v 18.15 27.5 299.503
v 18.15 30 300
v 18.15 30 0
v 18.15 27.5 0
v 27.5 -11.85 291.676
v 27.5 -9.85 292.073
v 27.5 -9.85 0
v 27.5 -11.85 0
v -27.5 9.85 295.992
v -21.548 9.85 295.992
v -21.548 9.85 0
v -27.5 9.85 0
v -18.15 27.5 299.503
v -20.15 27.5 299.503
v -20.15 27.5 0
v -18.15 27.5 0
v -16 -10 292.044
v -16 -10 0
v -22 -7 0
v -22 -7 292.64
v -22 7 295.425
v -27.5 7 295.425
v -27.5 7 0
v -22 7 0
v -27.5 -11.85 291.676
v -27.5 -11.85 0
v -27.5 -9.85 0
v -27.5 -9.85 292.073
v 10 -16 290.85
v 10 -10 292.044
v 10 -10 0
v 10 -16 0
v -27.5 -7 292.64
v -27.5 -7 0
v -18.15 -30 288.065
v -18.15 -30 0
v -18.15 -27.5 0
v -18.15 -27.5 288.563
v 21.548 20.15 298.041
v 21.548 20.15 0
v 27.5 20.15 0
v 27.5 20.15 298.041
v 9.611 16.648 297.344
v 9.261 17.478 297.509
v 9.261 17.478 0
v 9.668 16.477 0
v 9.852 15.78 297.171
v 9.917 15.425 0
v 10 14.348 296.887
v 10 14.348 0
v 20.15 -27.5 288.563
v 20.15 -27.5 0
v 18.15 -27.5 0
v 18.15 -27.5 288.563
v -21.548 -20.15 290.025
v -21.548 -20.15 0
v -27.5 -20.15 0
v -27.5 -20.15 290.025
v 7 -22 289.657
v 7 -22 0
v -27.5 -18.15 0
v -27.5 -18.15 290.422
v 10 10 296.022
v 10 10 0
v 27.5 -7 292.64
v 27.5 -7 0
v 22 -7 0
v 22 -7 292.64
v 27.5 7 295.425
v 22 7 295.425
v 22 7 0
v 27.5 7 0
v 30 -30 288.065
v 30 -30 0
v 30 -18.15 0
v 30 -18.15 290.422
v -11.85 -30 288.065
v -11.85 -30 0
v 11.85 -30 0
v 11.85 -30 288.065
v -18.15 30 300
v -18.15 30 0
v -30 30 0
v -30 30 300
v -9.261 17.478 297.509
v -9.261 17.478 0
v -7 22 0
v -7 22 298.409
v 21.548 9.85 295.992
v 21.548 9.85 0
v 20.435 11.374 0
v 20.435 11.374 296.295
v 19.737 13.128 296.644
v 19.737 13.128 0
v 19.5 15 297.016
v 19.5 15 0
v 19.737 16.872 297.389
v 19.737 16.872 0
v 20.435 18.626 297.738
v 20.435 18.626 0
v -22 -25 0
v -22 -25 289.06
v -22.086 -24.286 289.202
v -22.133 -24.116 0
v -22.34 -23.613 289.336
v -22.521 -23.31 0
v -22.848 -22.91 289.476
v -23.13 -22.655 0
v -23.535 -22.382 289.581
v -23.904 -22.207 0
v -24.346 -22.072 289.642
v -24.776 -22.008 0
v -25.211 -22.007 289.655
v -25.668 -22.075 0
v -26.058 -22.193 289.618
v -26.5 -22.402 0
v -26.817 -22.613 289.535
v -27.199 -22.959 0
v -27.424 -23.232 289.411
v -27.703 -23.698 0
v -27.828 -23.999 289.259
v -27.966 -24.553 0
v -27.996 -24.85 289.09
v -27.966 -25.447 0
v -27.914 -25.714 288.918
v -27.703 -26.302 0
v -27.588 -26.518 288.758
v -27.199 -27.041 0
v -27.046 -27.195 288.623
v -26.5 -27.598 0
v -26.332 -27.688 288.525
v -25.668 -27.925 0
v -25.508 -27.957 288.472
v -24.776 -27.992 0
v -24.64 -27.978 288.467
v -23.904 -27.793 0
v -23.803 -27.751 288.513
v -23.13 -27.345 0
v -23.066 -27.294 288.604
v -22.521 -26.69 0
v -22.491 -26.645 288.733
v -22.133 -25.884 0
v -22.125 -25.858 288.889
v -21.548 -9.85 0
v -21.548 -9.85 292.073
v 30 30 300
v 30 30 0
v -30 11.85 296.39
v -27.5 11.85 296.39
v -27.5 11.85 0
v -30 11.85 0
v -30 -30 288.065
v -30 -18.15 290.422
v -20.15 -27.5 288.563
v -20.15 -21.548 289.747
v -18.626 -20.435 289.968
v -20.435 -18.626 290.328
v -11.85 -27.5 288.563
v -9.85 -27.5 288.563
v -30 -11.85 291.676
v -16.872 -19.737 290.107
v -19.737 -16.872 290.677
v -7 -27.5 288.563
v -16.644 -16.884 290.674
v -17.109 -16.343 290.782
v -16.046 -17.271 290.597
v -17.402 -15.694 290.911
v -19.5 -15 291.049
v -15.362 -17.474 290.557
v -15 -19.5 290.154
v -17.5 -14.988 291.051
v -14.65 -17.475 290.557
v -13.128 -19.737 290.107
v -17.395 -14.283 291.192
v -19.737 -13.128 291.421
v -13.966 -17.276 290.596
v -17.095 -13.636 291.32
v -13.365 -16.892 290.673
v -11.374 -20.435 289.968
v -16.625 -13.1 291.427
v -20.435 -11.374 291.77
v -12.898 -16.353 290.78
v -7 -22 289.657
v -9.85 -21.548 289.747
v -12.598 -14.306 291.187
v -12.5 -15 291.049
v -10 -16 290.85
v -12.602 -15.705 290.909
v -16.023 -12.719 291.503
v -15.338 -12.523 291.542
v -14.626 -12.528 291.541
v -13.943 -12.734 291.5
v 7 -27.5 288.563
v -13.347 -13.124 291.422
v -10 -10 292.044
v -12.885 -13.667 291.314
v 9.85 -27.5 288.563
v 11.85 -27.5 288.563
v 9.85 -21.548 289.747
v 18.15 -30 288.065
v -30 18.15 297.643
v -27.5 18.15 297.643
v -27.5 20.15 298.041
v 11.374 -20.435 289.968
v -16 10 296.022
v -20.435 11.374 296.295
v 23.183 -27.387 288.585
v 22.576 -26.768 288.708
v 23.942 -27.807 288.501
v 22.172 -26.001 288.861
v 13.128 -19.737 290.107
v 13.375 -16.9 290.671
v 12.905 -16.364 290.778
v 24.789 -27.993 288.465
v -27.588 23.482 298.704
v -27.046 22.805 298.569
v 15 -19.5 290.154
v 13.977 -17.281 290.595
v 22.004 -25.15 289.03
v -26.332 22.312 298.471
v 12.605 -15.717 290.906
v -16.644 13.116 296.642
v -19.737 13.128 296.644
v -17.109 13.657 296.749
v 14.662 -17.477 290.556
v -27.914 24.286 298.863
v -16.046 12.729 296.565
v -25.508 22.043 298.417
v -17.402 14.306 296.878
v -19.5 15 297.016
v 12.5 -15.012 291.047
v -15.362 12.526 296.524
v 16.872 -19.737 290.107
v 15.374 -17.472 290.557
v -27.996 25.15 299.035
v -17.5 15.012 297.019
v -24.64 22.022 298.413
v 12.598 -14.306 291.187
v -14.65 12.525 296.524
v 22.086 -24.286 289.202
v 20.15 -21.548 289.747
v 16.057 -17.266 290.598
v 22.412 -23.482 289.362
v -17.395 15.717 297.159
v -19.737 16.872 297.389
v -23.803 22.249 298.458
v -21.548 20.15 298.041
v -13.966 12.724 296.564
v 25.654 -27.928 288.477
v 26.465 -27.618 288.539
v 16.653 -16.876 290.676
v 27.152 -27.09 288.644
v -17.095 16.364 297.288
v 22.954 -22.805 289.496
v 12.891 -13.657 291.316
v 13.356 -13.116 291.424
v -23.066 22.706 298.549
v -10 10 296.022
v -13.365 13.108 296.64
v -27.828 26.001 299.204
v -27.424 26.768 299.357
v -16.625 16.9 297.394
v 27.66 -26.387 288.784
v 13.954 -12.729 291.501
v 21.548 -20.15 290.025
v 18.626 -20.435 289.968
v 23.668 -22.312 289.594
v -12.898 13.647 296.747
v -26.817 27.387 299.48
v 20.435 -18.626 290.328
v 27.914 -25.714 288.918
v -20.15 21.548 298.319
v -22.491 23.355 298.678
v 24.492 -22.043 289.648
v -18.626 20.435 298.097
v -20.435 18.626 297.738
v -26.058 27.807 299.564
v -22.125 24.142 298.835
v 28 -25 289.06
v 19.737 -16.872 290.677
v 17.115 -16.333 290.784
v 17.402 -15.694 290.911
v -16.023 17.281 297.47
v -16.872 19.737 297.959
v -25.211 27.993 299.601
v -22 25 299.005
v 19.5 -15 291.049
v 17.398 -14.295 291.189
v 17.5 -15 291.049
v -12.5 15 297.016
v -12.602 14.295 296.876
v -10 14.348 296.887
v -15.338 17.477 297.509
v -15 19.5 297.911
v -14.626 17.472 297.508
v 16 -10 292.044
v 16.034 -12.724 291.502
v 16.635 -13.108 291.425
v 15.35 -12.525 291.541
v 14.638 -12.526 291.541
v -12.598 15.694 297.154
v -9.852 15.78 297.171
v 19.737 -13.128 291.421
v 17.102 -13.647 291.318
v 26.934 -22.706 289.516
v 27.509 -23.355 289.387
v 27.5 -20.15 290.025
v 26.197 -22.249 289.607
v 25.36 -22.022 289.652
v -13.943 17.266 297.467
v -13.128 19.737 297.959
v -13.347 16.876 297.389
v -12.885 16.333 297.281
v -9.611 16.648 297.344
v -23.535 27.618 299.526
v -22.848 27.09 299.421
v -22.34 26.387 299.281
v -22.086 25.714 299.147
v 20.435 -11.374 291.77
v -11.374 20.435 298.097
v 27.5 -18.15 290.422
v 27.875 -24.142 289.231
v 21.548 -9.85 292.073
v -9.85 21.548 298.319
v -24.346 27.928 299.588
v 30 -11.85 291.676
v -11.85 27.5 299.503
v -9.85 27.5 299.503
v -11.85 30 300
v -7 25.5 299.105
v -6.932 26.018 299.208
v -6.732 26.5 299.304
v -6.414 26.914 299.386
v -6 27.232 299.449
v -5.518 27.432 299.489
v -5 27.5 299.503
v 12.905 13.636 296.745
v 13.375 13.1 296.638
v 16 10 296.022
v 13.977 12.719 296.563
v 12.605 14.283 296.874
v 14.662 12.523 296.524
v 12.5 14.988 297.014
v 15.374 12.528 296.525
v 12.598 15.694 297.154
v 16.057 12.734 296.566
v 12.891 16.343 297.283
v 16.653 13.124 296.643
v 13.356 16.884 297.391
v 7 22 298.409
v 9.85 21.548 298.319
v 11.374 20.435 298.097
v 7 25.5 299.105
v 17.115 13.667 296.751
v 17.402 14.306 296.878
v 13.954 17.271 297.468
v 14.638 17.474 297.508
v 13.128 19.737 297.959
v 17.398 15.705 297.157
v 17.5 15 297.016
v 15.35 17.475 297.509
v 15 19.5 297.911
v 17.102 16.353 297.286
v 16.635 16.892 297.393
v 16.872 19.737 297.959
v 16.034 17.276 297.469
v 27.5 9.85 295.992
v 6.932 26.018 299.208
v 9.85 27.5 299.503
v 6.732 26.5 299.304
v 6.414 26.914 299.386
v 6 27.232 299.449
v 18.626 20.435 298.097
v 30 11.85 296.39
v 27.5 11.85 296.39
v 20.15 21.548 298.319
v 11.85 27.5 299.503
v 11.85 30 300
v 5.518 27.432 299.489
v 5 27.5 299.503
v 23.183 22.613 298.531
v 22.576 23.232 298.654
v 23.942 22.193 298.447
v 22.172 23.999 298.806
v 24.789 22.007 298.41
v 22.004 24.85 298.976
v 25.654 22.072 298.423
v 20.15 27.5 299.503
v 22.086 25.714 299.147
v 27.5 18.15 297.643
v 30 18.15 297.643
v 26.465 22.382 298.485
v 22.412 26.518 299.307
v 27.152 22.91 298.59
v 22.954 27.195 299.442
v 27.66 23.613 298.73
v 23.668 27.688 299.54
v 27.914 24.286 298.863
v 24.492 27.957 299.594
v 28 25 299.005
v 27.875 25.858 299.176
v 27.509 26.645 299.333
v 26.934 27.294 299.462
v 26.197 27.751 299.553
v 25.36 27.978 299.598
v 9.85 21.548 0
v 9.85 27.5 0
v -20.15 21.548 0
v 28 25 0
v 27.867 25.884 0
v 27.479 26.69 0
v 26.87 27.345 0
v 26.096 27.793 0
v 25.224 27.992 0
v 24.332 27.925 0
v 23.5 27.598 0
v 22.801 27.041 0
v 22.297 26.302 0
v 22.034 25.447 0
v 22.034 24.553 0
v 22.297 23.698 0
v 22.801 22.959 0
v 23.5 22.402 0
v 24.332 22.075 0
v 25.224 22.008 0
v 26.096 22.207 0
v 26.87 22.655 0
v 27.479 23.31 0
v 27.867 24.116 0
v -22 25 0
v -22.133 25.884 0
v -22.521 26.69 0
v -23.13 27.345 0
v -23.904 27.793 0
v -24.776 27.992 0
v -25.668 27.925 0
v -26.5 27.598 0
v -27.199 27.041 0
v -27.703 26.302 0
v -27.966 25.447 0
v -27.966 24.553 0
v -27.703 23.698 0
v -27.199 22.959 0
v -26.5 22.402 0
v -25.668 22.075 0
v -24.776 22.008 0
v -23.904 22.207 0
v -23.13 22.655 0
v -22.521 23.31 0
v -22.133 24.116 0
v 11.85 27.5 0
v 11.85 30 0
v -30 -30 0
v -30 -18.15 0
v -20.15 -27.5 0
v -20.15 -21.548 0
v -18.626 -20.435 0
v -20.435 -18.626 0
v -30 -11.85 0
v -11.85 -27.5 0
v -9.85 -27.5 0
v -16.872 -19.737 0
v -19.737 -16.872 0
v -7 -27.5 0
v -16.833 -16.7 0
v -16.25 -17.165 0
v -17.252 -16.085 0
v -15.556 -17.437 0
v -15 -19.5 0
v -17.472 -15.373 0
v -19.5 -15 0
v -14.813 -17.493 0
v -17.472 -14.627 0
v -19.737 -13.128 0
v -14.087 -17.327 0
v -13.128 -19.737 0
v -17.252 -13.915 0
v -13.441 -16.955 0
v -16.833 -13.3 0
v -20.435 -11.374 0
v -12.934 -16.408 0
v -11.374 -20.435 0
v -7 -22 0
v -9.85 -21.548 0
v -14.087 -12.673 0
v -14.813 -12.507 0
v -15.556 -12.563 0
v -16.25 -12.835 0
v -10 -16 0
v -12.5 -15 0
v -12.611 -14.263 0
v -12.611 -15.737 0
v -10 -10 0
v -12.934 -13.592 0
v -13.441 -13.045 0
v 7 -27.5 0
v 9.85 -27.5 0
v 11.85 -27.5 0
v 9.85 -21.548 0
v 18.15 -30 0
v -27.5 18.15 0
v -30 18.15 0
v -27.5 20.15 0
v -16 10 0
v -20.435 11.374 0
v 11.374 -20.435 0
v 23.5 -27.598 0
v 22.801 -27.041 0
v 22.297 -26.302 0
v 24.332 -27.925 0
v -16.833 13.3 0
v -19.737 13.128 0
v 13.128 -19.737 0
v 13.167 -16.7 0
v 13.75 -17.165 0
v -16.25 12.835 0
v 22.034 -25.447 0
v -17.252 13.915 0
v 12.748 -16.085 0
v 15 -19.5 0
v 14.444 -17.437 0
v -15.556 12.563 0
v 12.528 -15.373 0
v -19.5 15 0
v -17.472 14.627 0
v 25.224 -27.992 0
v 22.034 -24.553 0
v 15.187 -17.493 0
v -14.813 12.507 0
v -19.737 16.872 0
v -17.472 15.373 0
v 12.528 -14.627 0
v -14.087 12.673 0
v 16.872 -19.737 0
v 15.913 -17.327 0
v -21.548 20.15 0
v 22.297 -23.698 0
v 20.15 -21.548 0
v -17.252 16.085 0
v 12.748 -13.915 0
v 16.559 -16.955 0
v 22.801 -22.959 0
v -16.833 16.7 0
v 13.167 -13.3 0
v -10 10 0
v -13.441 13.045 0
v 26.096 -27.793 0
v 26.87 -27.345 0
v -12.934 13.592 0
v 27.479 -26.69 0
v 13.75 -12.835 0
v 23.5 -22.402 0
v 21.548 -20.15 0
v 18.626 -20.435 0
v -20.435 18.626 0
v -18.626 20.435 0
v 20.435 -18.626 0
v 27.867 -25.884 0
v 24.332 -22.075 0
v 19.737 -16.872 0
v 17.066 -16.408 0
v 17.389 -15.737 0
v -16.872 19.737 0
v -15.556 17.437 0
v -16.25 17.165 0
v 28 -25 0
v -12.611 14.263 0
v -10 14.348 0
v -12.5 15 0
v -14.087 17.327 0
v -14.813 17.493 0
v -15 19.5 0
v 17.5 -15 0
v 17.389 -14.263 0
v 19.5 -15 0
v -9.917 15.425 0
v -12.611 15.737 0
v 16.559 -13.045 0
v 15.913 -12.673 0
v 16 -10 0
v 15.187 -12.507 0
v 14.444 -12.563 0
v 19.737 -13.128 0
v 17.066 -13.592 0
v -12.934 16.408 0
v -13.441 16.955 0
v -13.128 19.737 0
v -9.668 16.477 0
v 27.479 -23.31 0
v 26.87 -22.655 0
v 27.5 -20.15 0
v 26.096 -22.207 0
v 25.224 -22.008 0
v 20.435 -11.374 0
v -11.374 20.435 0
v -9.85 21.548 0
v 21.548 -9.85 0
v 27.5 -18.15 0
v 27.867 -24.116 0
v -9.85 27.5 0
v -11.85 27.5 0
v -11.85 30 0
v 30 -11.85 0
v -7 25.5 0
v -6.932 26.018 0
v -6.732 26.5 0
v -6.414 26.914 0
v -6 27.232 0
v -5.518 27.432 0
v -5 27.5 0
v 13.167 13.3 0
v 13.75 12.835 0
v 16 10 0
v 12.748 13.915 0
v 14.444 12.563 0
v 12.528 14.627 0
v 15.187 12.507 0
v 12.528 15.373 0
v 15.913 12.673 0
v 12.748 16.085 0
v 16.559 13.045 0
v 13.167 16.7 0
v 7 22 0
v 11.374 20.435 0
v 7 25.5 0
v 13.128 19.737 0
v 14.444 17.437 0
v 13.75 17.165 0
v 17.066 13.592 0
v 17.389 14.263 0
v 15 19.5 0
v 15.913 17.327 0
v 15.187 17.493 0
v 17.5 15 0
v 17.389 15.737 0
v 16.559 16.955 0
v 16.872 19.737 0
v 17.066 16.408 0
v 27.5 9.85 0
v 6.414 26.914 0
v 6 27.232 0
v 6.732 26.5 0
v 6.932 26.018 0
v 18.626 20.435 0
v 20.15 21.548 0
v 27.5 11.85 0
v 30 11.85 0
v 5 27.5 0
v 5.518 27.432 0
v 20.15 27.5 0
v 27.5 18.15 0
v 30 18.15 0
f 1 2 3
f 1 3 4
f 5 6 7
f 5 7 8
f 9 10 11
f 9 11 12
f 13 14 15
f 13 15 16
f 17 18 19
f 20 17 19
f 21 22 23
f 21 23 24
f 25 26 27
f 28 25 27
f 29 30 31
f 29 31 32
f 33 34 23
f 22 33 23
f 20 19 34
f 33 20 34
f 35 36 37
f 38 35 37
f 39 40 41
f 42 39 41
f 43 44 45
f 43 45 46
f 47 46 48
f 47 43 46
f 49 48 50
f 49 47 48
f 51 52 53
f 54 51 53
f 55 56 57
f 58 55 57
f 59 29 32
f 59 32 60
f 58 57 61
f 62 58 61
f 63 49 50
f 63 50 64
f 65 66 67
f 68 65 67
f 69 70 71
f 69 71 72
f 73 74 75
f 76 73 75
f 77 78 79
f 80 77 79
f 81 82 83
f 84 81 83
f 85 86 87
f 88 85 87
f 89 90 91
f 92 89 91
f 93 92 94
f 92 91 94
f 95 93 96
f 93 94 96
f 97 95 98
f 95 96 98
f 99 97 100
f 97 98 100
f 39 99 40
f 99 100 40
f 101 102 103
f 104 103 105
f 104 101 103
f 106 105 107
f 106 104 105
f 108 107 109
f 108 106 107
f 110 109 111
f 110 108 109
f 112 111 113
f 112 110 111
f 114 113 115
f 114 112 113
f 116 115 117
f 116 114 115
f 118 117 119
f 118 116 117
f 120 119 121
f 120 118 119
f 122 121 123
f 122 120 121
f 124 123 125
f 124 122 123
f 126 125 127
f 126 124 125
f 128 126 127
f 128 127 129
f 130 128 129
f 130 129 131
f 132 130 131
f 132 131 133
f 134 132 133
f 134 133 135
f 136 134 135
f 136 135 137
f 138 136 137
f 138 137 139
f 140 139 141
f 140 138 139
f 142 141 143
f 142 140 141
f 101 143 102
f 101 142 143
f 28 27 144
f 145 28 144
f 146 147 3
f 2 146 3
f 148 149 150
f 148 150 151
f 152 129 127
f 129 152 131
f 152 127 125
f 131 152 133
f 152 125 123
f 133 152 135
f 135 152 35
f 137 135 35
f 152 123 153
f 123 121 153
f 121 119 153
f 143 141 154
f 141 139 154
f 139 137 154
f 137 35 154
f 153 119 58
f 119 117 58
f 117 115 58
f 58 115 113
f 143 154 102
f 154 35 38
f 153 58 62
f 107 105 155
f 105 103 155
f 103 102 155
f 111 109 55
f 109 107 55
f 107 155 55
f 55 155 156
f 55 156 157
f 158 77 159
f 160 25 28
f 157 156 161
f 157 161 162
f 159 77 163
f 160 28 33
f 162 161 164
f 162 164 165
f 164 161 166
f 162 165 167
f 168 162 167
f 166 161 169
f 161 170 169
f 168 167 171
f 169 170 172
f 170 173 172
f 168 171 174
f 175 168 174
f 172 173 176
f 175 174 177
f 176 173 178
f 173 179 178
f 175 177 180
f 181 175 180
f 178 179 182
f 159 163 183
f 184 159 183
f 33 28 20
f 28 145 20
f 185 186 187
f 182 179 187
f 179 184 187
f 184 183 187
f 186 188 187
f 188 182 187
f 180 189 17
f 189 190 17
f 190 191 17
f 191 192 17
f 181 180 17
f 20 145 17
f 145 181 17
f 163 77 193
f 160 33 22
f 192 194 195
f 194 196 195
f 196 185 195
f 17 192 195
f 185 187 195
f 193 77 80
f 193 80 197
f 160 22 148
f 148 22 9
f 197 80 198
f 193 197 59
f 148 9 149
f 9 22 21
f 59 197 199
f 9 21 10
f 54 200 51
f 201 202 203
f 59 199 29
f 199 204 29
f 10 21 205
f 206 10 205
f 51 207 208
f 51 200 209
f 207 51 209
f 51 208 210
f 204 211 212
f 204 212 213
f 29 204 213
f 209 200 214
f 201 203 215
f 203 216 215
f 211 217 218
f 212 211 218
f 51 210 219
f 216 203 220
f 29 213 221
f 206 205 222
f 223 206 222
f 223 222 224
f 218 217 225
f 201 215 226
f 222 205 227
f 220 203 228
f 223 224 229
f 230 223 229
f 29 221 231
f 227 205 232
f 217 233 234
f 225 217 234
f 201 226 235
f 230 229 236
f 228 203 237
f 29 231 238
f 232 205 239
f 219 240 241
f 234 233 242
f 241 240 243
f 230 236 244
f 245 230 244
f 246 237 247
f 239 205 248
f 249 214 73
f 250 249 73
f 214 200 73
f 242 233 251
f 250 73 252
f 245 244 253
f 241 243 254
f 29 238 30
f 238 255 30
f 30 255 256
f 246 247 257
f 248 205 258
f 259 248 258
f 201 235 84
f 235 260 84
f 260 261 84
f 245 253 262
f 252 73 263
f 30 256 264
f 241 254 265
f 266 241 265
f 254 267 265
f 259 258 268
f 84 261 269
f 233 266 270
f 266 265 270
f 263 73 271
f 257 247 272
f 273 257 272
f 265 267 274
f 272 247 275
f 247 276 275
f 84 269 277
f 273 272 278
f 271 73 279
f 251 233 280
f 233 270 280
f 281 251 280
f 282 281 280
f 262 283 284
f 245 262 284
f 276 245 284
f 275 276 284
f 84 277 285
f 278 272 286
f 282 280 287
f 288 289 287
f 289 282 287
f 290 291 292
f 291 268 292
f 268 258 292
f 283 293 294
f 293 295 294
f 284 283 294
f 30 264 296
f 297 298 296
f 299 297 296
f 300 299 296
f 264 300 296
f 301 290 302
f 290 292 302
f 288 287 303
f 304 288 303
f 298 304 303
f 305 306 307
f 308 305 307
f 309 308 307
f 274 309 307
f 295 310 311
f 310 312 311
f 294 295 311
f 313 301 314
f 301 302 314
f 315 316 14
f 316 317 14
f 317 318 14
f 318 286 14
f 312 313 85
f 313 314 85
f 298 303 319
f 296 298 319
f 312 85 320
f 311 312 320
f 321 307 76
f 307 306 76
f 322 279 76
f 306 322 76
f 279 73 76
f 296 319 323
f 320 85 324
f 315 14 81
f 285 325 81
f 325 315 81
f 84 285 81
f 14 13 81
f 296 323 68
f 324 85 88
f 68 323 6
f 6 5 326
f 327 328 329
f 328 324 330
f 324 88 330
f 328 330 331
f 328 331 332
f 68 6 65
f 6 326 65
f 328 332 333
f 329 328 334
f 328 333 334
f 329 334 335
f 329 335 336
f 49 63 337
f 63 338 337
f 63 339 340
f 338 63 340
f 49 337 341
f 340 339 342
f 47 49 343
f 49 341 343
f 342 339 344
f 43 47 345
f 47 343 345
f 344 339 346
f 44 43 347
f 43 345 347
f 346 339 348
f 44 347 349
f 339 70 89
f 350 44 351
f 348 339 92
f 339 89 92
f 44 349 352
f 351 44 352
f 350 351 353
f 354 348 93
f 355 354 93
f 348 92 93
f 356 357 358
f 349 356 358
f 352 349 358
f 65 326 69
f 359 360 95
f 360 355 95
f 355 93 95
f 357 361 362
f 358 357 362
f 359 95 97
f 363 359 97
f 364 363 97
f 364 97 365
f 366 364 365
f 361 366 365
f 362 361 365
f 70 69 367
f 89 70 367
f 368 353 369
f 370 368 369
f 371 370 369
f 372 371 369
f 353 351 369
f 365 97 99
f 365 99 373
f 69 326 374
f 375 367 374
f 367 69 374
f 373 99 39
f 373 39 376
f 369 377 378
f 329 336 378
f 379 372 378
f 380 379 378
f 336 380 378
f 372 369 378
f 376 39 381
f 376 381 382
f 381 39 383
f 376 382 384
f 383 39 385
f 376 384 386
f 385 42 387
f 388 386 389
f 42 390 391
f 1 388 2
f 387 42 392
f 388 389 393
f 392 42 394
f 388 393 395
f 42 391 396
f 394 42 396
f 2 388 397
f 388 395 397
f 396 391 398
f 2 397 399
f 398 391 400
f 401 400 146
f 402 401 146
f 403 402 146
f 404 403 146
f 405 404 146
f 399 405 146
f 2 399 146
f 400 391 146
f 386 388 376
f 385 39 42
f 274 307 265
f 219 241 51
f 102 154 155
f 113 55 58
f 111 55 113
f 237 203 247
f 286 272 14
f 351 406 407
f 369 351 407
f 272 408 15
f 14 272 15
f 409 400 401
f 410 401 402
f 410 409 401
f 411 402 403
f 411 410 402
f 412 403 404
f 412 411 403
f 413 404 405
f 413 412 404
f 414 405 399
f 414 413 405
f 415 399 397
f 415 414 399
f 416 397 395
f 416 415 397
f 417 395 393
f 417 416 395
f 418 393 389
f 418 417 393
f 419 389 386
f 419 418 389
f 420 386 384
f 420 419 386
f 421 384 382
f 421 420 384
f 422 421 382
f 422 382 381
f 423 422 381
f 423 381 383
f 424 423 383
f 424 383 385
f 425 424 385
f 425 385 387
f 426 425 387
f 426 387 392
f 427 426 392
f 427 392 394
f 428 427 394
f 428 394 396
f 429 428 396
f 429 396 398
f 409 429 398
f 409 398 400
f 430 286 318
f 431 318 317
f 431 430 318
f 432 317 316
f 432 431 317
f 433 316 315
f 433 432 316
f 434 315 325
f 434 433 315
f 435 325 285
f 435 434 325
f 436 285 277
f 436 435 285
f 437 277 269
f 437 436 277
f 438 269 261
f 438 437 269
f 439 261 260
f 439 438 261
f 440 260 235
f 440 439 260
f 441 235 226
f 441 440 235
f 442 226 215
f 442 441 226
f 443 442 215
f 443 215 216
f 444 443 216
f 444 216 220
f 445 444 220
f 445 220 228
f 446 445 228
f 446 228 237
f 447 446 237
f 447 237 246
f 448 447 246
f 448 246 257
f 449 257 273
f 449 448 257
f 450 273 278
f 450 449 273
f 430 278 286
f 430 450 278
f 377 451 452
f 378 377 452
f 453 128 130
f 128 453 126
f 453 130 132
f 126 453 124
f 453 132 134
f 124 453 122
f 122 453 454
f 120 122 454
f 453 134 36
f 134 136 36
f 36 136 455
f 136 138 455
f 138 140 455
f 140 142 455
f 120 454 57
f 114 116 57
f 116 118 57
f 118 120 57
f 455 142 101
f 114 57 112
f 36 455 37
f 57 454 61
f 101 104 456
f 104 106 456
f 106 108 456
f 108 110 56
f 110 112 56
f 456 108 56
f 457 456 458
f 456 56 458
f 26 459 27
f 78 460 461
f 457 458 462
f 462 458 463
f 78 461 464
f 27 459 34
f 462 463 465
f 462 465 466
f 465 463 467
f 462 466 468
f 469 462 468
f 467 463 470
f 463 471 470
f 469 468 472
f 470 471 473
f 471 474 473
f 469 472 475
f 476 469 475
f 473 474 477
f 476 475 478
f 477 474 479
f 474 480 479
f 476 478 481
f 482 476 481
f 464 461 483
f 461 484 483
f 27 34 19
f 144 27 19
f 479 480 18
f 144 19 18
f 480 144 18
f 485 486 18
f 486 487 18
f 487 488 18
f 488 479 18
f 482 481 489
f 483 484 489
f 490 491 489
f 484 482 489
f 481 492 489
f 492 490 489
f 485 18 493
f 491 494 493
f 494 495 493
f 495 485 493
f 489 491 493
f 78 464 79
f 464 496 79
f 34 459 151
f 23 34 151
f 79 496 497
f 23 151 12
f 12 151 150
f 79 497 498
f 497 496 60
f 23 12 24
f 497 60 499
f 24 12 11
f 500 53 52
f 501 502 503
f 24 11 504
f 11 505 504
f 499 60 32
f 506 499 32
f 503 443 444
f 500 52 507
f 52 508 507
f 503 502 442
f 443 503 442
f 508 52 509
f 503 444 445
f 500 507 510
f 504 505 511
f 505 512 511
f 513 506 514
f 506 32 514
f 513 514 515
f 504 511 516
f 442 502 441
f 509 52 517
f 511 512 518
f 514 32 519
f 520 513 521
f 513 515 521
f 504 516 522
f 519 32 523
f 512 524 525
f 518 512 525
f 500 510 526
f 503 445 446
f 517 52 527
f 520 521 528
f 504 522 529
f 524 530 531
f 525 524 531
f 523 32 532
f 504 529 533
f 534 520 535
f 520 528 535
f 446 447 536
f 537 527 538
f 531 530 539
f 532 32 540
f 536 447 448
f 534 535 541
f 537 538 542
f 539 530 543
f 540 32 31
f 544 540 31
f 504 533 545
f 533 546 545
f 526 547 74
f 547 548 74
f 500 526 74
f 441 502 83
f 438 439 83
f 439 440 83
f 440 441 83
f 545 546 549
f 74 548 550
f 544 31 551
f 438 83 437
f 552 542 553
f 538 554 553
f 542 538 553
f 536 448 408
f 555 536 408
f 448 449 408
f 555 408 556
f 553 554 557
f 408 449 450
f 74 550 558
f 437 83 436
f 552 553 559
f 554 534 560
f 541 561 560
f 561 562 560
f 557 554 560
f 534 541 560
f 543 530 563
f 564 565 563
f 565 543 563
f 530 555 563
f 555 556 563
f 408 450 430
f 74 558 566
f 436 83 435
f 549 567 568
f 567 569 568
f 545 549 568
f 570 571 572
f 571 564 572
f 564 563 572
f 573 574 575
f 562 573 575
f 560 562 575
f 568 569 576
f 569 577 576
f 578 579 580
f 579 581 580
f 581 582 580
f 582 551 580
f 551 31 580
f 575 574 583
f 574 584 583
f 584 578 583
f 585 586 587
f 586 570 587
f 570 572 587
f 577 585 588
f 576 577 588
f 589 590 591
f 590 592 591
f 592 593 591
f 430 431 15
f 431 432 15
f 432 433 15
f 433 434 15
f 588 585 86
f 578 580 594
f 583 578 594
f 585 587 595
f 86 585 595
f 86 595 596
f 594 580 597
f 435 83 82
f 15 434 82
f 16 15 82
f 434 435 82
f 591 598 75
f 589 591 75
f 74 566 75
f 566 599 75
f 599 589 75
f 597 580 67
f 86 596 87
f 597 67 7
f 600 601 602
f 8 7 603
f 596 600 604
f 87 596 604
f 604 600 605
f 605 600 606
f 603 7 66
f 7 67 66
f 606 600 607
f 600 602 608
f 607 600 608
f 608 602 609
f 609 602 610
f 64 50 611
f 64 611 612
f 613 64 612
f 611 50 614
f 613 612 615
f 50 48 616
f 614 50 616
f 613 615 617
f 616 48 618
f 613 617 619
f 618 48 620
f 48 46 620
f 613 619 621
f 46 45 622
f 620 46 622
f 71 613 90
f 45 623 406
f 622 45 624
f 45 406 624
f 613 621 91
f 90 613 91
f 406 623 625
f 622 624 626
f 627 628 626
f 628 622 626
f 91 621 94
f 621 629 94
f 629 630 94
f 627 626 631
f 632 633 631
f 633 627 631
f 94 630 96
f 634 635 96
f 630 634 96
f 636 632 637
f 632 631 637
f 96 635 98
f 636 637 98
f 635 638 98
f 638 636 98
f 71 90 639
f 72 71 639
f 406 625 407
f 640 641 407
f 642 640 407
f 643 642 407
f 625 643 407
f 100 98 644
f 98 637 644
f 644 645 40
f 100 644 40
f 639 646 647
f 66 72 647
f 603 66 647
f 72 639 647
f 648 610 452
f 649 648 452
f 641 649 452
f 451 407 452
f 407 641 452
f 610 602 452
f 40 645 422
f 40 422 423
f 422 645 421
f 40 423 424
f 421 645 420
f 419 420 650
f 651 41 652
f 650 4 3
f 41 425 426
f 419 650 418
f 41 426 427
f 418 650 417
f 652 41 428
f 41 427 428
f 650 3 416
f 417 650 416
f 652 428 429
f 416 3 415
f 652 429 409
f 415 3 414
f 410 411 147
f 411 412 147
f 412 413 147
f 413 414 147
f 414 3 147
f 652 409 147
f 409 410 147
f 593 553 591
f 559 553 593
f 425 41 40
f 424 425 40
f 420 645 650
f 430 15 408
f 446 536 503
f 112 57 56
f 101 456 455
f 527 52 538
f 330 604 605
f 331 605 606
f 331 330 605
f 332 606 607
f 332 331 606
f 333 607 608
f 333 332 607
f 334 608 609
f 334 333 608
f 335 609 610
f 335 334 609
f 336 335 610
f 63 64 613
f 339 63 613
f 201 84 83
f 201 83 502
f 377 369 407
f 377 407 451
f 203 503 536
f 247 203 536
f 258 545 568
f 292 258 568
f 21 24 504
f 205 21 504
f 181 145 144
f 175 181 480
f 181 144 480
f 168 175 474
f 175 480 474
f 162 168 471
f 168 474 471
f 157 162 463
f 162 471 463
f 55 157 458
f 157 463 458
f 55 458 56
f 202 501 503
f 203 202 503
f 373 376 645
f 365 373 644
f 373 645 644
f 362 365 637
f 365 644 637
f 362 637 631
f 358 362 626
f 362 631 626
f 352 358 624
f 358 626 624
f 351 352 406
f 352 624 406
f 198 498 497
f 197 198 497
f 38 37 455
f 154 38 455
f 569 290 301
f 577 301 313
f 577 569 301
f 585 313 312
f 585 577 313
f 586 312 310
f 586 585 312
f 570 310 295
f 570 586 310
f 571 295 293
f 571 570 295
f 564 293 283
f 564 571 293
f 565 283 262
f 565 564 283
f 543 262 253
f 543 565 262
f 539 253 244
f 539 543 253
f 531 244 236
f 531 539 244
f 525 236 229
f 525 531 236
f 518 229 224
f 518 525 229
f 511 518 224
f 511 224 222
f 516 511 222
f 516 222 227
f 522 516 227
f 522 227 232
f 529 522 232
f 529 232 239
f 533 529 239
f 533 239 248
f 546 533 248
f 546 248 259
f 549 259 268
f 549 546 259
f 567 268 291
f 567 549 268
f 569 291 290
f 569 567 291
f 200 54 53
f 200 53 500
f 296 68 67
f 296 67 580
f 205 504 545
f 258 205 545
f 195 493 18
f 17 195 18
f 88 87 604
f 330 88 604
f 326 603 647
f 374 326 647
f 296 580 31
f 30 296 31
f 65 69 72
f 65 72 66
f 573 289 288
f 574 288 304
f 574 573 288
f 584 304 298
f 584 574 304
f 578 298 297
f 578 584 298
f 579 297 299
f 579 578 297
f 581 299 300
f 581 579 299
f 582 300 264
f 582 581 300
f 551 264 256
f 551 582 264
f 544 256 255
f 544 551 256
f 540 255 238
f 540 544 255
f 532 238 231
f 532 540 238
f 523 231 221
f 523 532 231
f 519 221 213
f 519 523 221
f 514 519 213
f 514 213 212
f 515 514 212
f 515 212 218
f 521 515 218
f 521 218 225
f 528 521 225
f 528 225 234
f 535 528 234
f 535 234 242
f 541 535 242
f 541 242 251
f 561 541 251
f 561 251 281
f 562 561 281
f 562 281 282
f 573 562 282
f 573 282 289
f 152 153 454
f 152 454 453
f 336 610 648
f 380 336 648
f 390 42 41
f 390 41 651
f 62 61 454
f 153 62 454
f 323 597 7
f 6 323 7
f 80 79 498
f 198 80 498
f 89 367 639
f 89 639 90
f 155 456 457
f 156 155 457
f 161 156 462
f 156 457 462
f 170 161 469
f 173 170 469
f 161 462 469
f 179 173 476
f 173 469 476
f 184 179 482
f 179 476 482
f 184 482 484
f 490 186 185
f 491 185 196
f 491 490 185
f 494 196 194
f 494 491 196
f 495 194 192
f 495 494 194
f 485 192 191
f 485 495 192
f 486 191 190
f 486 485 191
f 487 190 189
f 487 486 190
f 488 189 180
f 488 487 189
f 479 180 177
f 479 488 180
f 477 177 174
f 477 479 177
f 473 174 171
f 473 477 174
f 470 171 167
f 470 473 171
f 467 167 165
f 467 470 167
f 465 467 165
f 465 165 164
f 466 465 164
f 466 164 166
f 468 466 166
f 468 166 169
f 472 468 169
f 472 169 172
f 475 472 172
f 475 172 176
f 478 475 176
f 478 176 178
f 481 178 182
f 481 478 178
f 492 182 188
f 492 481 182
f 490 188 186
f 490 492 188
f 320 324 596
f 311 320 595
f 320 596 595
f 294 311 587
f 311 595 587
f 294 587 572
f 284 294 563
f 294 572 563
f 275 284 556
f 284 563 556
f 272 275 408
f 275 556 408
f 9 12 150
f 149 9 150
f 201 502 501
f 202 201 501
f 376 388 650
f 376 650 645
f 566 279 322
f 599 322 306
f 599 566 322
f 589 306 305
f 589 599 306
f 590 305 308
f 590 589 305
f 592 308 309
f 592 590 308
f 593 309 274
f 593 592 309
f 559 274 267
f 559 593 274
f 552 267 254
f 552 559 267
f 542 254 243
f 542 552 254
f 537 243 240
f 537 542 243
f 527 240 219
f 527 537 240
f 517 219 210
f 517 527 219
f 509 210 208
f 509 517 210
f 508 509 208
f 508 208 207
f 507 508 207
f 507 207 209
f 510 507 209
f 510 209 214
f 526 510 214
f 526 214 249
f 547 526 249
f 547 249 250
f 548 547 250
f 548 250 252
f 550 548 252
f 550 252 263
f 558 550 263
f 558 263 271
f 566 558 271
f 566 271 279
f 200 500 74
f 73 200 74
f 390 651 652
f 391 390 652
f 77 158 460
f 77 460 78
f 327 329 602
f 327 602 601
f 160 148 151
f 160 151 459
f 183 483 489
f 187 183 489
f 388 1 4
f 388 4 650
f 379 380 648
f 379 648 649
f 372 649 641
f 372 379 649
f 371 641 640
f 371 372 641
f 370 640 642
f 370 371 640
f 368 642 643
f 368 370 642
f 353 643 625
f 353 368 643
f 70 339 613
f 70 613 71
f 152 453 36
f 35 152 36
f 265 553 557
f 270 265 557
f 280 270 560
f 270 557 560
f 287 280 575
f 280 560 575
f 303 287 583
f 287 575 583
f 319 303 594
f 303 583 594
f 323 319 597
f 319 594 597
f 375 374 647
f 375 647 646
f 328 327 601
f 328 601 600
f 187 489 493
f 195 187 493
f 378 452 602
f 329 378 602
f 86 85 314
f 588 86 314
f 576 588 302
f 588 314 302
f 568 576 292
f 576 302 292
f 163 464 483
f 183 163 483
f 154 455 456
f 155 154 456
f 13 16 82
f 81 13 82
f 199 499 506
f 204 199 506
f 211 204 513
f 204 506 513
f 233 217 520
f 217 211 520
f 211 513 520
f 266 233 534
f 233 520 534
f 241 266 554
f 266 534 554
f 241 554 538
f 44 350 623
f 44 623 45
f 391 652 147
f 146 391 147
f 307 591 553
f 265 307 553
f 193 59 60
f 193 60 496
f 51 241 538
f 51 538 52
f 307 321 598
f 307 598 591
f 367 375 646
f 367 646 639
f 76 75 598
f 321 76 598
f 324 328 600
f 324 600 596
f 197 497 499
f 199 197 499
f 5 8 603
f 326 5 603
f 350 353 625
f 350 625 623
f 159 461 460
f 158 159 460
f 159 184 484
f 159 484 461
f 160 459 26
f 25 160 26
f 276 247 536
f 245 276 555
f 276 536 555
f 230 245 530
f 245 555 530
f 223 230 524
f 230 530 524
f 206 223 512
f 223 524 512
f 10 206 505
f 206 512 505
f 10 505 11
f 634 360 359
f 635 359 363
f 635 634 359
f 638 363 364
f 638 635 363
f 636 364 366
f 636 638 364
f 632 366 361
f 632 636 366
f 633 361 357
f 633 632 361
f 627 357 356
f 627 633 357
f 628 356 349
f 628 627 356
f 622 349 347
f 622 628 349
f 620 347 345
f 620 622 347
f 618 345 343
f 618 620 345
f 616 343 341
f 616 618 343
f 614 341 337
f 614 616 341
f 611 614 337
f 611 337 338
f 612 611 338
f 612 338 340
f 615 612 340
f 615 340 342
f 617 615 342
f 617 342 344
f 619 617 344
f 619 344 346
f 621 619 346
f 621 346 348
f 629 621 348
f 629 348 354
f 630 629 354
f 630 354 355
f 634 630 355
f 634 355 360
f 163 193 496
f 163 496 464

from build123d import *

# Parameters (mm, degrees)
F0_R          = 3
F0_R_2        = 2.5
F1_DEPTH      = 300
F2_R          = 2
F3_R          = 7
F5_DEPTH      = 30
F5_DEPTH_BACK = 30


# Not quite as in the source:
# - a feature names something its author has since deleted; it is built from what else it names


with BuildPart() as f1:
    # F0 (on Top) → F1 (new body)
    with BuildSketch(Plane.XY):
        with BuildLine():
            Line((18.15, -30), (30, -30))
            Line((30, -30), (30, -18.15))
            Line((30, -18.15), (27.5, -18.15))
            Line((27.5, -18.15), (27.5, -20.15))
            Line((27.5, -20.15), (21.5477069044, -20.15))
            ThreePointArc((21.5477069044, -20.15), (19.5, -15), (21.5477069044, -9.85))
            Line((21.5477069044, -9.85), (27.5, -9.85))
            Line((27.5, -9.85), (27.5, -11.85))
            Line((27.5, -11.85), (30, -11.85))
            Line((30, -11.85), (30, 11.85))
            Line((30, 11.85), (27.5, 11.85))
            Line((27.5, 11.85), (27.5, 9.85))
            Line((27.5, 9.85), (21.5477069044, 9.85))
            ThreePointArc((21.5477069044, 9.85), (19.5, 15), (21.5477069044, 20.15))
            Line((21.5477069044, 20.15), (27.5, 20.15))
            Line((27.5, 20.15), (27.5, 18.15))
            Line((27.5, 18.15), (30, 18.15))
            Line((30, 18.15), (30, 30))
            Line((30, 30), (18.15, 30))
            Line((18.15, 30), (18.15, 27.5))
            Line((18.15, 27.5), (20.15, 27.5))
            Line((20.15, 27.5), (20.15, 21.5477069044))
            ThreePointArc((20.15, 21.5477069044), (15, 19.5), (9.85, 21.5477069044))
            Line((9.85, 21.5477069044), (9.85, 27.5))
            Line((9.85, 27.5), (11.85, 27.5))
            Line((11.85, 27.5), (11.85, 30))
            Line((11.85, 30), (-11.85, 30))
            Line((-11.85, 30), (-11.85, 27.5))
            Line((-11.85, 27.5), (-9.85, 27.5))
            Line((-9.85, 27.5), (-9.85, 21.5477069044))
            ThreePointArc((-9.85, 21.5477069044), (-15, 19.5), (-20.15, 21.5477069044))
            Line((-20.15, 21.5477069044), (-20.15, 27.5))
            Line((-20.15, 27.5), (-18.15, 27.5))
            Line((-18.15, 27.5), (-18.15, 30))
            Line((-18.15, 30), (-30, 30))
            Line((-30, 30), (-30, 18.15))
            Line((-30, 18.15), (-27.5, 18.15))
            Line((-27.5, 18.15), (-27.5, 20.15))
            Line((-27.5, 20.15), (-21.5477069044, 20.15))
            ThreePointArc((-21.5477069044, 20.15), (-19.5, 15), (-21.5477069044, 9.85))
            Line((-21.5477069044, 9.85), (-27.5, 9.85))
            Line((-27.5, 9.85), (-27.5, 11.85))
            Line((-27.5, 11.85), (-30, 11.85))
            Line((-30, 11.85), (-30, -11.85))
            Line((-30, -11.85), (-27.5, -11.85))
            Line((-27.5, -11.85), (-27.5, -9.85))
            Line((-27.5, -9.85), (-21.5477069044, -9.85))
            ThreePointArc((-21.5477069044, -9.85), (-19.5, -15), (-21.5477069044, -20.15))
            Line((-21.5477069044, -20.15), (-27.5, -20.15))
            Line((-27.5, -20.15), (-27.5, -18.15))
            Line((-27.5, -18.15), (-30, -18.15))
            Line((-30, -18.15), (-30, -30))
            Line((-30, -30), (-18.15, -30))
            Line((-18.15, -30), (-18.15, -27.5))
            Line((-18.15, -27.5), (-20.15, -27.5))
            Line((-20.15, -27.5), (-20.15, -21.5477069044))
            ThreePointArc((-20.15, -21.5477069044), (-15, -19.5), (-9.85, -21.5477069044))
            Line((-9.85, -21.5477069044), (-9.85, -27.5))
            Line((-9.85, -27.5), (-11.85, -27.5))
            Line((-11.85, -27.5), (-11.85, -30))
            Line((-11.85, -30), (11.85, -30))
            Line((11.85, -30), (11.85, -27.5))
            Line((11.85, -27.5), (9.85, -27.5))
            Line((9.85, -27.5), (9.85, -21.5477069044))
            ThreePointArc((9.85, -21.5477069044), (15, -19.5), (20.15, -21.5477069044))
            Line((20.15, -21.5477069044), (20.15, -27.5))
            Line((20.15, -27.5), (18.15, -27.5))
            Line((18.15, -27.5), (18.15, -30))
        make_face()
        with Locations((-25, -25)):
            Circle(F0_R, mode=Mode.SUBTRACT)
        with Locations((-15, -15)):
            Circle(F0_R_2, mode=Mode.SUBTRACT)
        with Locations((25, -25)):
            Circle(F0_R, mode=Mode.SUBTRACT)
        with Locations((15, -15)):
            Circle(F0_R_2, mode=Mode.SUBTRACT)
        with Locations((-25, 25)):
            Circle(F0_R, mode=Mode.SUBTRACT)
        with Locations((-15, 15)):
            Circle(F0_R_2, mode=Mode.SUBTRACT)
        Polygon((-7, 22), (-7, 27.5), (0, 27.5), (7, 27.5), (7, 22), (10, 16), (10, 10), (16, 10), (22, 7), (27.5, 7), (27.5, 0), (27.5, -7), (22, -7), (16, -10), (10, -10), (10, -16), (7, -22), (7, -27.5), (0, -27.5), (-7, -27.5), (-7, -22), (-10, -16), (-10, -10), (-16, -10), (-22, -7), (-27.5, -7), (-27.5, 0), (-27.5, 7), (-22, 7), (-16, 10), (-10, 10), (-10, 16), align=None, mode=Mode.SUBTRACT)
        with Locations((15, 15)):
            Circle(F0_R_2, mode=Mode.SUBTRACT)
        with Locations((25, 25)):
            Circle(F0_R, mode=Mode.SUBTRACT)
    extrude(amount=F1_DEPTH)

    # F2
    f2_edges = [f1.edges().sort_by_distance(p)[0] for p in [
        (-7, 27.5, 150),
        (7, 27.5, 150),
    ]]
    fillet(f2_edges, radius=F2_R)

    # F3
    f3_edges = [f1.edges().sort_by_distance(p)[0] for p in [
        (-10, 16, 150),
        (10, 16, 150),
    ]]
    fillet(f3_edges, radius=F3_R)

    # F4 (on Right) → F5 (cut, two sides)
    with BuildSketch(Plane.YZ) as f5_sk:
        Polygon((-20.5082305996, 553.922022371), (-199.5184071674, 518.3146843648), (-149.0101765678, 264.3926619939), (30, 300), align=None)
    extrude(amount=F5_DEPTH, mode=Mode.SUBTRACT)
    extrude(f5_sk.sketch, amount=-F5_DEPTH_BACK, mode=Mode.SUBTRACT)


solid = f1.part
